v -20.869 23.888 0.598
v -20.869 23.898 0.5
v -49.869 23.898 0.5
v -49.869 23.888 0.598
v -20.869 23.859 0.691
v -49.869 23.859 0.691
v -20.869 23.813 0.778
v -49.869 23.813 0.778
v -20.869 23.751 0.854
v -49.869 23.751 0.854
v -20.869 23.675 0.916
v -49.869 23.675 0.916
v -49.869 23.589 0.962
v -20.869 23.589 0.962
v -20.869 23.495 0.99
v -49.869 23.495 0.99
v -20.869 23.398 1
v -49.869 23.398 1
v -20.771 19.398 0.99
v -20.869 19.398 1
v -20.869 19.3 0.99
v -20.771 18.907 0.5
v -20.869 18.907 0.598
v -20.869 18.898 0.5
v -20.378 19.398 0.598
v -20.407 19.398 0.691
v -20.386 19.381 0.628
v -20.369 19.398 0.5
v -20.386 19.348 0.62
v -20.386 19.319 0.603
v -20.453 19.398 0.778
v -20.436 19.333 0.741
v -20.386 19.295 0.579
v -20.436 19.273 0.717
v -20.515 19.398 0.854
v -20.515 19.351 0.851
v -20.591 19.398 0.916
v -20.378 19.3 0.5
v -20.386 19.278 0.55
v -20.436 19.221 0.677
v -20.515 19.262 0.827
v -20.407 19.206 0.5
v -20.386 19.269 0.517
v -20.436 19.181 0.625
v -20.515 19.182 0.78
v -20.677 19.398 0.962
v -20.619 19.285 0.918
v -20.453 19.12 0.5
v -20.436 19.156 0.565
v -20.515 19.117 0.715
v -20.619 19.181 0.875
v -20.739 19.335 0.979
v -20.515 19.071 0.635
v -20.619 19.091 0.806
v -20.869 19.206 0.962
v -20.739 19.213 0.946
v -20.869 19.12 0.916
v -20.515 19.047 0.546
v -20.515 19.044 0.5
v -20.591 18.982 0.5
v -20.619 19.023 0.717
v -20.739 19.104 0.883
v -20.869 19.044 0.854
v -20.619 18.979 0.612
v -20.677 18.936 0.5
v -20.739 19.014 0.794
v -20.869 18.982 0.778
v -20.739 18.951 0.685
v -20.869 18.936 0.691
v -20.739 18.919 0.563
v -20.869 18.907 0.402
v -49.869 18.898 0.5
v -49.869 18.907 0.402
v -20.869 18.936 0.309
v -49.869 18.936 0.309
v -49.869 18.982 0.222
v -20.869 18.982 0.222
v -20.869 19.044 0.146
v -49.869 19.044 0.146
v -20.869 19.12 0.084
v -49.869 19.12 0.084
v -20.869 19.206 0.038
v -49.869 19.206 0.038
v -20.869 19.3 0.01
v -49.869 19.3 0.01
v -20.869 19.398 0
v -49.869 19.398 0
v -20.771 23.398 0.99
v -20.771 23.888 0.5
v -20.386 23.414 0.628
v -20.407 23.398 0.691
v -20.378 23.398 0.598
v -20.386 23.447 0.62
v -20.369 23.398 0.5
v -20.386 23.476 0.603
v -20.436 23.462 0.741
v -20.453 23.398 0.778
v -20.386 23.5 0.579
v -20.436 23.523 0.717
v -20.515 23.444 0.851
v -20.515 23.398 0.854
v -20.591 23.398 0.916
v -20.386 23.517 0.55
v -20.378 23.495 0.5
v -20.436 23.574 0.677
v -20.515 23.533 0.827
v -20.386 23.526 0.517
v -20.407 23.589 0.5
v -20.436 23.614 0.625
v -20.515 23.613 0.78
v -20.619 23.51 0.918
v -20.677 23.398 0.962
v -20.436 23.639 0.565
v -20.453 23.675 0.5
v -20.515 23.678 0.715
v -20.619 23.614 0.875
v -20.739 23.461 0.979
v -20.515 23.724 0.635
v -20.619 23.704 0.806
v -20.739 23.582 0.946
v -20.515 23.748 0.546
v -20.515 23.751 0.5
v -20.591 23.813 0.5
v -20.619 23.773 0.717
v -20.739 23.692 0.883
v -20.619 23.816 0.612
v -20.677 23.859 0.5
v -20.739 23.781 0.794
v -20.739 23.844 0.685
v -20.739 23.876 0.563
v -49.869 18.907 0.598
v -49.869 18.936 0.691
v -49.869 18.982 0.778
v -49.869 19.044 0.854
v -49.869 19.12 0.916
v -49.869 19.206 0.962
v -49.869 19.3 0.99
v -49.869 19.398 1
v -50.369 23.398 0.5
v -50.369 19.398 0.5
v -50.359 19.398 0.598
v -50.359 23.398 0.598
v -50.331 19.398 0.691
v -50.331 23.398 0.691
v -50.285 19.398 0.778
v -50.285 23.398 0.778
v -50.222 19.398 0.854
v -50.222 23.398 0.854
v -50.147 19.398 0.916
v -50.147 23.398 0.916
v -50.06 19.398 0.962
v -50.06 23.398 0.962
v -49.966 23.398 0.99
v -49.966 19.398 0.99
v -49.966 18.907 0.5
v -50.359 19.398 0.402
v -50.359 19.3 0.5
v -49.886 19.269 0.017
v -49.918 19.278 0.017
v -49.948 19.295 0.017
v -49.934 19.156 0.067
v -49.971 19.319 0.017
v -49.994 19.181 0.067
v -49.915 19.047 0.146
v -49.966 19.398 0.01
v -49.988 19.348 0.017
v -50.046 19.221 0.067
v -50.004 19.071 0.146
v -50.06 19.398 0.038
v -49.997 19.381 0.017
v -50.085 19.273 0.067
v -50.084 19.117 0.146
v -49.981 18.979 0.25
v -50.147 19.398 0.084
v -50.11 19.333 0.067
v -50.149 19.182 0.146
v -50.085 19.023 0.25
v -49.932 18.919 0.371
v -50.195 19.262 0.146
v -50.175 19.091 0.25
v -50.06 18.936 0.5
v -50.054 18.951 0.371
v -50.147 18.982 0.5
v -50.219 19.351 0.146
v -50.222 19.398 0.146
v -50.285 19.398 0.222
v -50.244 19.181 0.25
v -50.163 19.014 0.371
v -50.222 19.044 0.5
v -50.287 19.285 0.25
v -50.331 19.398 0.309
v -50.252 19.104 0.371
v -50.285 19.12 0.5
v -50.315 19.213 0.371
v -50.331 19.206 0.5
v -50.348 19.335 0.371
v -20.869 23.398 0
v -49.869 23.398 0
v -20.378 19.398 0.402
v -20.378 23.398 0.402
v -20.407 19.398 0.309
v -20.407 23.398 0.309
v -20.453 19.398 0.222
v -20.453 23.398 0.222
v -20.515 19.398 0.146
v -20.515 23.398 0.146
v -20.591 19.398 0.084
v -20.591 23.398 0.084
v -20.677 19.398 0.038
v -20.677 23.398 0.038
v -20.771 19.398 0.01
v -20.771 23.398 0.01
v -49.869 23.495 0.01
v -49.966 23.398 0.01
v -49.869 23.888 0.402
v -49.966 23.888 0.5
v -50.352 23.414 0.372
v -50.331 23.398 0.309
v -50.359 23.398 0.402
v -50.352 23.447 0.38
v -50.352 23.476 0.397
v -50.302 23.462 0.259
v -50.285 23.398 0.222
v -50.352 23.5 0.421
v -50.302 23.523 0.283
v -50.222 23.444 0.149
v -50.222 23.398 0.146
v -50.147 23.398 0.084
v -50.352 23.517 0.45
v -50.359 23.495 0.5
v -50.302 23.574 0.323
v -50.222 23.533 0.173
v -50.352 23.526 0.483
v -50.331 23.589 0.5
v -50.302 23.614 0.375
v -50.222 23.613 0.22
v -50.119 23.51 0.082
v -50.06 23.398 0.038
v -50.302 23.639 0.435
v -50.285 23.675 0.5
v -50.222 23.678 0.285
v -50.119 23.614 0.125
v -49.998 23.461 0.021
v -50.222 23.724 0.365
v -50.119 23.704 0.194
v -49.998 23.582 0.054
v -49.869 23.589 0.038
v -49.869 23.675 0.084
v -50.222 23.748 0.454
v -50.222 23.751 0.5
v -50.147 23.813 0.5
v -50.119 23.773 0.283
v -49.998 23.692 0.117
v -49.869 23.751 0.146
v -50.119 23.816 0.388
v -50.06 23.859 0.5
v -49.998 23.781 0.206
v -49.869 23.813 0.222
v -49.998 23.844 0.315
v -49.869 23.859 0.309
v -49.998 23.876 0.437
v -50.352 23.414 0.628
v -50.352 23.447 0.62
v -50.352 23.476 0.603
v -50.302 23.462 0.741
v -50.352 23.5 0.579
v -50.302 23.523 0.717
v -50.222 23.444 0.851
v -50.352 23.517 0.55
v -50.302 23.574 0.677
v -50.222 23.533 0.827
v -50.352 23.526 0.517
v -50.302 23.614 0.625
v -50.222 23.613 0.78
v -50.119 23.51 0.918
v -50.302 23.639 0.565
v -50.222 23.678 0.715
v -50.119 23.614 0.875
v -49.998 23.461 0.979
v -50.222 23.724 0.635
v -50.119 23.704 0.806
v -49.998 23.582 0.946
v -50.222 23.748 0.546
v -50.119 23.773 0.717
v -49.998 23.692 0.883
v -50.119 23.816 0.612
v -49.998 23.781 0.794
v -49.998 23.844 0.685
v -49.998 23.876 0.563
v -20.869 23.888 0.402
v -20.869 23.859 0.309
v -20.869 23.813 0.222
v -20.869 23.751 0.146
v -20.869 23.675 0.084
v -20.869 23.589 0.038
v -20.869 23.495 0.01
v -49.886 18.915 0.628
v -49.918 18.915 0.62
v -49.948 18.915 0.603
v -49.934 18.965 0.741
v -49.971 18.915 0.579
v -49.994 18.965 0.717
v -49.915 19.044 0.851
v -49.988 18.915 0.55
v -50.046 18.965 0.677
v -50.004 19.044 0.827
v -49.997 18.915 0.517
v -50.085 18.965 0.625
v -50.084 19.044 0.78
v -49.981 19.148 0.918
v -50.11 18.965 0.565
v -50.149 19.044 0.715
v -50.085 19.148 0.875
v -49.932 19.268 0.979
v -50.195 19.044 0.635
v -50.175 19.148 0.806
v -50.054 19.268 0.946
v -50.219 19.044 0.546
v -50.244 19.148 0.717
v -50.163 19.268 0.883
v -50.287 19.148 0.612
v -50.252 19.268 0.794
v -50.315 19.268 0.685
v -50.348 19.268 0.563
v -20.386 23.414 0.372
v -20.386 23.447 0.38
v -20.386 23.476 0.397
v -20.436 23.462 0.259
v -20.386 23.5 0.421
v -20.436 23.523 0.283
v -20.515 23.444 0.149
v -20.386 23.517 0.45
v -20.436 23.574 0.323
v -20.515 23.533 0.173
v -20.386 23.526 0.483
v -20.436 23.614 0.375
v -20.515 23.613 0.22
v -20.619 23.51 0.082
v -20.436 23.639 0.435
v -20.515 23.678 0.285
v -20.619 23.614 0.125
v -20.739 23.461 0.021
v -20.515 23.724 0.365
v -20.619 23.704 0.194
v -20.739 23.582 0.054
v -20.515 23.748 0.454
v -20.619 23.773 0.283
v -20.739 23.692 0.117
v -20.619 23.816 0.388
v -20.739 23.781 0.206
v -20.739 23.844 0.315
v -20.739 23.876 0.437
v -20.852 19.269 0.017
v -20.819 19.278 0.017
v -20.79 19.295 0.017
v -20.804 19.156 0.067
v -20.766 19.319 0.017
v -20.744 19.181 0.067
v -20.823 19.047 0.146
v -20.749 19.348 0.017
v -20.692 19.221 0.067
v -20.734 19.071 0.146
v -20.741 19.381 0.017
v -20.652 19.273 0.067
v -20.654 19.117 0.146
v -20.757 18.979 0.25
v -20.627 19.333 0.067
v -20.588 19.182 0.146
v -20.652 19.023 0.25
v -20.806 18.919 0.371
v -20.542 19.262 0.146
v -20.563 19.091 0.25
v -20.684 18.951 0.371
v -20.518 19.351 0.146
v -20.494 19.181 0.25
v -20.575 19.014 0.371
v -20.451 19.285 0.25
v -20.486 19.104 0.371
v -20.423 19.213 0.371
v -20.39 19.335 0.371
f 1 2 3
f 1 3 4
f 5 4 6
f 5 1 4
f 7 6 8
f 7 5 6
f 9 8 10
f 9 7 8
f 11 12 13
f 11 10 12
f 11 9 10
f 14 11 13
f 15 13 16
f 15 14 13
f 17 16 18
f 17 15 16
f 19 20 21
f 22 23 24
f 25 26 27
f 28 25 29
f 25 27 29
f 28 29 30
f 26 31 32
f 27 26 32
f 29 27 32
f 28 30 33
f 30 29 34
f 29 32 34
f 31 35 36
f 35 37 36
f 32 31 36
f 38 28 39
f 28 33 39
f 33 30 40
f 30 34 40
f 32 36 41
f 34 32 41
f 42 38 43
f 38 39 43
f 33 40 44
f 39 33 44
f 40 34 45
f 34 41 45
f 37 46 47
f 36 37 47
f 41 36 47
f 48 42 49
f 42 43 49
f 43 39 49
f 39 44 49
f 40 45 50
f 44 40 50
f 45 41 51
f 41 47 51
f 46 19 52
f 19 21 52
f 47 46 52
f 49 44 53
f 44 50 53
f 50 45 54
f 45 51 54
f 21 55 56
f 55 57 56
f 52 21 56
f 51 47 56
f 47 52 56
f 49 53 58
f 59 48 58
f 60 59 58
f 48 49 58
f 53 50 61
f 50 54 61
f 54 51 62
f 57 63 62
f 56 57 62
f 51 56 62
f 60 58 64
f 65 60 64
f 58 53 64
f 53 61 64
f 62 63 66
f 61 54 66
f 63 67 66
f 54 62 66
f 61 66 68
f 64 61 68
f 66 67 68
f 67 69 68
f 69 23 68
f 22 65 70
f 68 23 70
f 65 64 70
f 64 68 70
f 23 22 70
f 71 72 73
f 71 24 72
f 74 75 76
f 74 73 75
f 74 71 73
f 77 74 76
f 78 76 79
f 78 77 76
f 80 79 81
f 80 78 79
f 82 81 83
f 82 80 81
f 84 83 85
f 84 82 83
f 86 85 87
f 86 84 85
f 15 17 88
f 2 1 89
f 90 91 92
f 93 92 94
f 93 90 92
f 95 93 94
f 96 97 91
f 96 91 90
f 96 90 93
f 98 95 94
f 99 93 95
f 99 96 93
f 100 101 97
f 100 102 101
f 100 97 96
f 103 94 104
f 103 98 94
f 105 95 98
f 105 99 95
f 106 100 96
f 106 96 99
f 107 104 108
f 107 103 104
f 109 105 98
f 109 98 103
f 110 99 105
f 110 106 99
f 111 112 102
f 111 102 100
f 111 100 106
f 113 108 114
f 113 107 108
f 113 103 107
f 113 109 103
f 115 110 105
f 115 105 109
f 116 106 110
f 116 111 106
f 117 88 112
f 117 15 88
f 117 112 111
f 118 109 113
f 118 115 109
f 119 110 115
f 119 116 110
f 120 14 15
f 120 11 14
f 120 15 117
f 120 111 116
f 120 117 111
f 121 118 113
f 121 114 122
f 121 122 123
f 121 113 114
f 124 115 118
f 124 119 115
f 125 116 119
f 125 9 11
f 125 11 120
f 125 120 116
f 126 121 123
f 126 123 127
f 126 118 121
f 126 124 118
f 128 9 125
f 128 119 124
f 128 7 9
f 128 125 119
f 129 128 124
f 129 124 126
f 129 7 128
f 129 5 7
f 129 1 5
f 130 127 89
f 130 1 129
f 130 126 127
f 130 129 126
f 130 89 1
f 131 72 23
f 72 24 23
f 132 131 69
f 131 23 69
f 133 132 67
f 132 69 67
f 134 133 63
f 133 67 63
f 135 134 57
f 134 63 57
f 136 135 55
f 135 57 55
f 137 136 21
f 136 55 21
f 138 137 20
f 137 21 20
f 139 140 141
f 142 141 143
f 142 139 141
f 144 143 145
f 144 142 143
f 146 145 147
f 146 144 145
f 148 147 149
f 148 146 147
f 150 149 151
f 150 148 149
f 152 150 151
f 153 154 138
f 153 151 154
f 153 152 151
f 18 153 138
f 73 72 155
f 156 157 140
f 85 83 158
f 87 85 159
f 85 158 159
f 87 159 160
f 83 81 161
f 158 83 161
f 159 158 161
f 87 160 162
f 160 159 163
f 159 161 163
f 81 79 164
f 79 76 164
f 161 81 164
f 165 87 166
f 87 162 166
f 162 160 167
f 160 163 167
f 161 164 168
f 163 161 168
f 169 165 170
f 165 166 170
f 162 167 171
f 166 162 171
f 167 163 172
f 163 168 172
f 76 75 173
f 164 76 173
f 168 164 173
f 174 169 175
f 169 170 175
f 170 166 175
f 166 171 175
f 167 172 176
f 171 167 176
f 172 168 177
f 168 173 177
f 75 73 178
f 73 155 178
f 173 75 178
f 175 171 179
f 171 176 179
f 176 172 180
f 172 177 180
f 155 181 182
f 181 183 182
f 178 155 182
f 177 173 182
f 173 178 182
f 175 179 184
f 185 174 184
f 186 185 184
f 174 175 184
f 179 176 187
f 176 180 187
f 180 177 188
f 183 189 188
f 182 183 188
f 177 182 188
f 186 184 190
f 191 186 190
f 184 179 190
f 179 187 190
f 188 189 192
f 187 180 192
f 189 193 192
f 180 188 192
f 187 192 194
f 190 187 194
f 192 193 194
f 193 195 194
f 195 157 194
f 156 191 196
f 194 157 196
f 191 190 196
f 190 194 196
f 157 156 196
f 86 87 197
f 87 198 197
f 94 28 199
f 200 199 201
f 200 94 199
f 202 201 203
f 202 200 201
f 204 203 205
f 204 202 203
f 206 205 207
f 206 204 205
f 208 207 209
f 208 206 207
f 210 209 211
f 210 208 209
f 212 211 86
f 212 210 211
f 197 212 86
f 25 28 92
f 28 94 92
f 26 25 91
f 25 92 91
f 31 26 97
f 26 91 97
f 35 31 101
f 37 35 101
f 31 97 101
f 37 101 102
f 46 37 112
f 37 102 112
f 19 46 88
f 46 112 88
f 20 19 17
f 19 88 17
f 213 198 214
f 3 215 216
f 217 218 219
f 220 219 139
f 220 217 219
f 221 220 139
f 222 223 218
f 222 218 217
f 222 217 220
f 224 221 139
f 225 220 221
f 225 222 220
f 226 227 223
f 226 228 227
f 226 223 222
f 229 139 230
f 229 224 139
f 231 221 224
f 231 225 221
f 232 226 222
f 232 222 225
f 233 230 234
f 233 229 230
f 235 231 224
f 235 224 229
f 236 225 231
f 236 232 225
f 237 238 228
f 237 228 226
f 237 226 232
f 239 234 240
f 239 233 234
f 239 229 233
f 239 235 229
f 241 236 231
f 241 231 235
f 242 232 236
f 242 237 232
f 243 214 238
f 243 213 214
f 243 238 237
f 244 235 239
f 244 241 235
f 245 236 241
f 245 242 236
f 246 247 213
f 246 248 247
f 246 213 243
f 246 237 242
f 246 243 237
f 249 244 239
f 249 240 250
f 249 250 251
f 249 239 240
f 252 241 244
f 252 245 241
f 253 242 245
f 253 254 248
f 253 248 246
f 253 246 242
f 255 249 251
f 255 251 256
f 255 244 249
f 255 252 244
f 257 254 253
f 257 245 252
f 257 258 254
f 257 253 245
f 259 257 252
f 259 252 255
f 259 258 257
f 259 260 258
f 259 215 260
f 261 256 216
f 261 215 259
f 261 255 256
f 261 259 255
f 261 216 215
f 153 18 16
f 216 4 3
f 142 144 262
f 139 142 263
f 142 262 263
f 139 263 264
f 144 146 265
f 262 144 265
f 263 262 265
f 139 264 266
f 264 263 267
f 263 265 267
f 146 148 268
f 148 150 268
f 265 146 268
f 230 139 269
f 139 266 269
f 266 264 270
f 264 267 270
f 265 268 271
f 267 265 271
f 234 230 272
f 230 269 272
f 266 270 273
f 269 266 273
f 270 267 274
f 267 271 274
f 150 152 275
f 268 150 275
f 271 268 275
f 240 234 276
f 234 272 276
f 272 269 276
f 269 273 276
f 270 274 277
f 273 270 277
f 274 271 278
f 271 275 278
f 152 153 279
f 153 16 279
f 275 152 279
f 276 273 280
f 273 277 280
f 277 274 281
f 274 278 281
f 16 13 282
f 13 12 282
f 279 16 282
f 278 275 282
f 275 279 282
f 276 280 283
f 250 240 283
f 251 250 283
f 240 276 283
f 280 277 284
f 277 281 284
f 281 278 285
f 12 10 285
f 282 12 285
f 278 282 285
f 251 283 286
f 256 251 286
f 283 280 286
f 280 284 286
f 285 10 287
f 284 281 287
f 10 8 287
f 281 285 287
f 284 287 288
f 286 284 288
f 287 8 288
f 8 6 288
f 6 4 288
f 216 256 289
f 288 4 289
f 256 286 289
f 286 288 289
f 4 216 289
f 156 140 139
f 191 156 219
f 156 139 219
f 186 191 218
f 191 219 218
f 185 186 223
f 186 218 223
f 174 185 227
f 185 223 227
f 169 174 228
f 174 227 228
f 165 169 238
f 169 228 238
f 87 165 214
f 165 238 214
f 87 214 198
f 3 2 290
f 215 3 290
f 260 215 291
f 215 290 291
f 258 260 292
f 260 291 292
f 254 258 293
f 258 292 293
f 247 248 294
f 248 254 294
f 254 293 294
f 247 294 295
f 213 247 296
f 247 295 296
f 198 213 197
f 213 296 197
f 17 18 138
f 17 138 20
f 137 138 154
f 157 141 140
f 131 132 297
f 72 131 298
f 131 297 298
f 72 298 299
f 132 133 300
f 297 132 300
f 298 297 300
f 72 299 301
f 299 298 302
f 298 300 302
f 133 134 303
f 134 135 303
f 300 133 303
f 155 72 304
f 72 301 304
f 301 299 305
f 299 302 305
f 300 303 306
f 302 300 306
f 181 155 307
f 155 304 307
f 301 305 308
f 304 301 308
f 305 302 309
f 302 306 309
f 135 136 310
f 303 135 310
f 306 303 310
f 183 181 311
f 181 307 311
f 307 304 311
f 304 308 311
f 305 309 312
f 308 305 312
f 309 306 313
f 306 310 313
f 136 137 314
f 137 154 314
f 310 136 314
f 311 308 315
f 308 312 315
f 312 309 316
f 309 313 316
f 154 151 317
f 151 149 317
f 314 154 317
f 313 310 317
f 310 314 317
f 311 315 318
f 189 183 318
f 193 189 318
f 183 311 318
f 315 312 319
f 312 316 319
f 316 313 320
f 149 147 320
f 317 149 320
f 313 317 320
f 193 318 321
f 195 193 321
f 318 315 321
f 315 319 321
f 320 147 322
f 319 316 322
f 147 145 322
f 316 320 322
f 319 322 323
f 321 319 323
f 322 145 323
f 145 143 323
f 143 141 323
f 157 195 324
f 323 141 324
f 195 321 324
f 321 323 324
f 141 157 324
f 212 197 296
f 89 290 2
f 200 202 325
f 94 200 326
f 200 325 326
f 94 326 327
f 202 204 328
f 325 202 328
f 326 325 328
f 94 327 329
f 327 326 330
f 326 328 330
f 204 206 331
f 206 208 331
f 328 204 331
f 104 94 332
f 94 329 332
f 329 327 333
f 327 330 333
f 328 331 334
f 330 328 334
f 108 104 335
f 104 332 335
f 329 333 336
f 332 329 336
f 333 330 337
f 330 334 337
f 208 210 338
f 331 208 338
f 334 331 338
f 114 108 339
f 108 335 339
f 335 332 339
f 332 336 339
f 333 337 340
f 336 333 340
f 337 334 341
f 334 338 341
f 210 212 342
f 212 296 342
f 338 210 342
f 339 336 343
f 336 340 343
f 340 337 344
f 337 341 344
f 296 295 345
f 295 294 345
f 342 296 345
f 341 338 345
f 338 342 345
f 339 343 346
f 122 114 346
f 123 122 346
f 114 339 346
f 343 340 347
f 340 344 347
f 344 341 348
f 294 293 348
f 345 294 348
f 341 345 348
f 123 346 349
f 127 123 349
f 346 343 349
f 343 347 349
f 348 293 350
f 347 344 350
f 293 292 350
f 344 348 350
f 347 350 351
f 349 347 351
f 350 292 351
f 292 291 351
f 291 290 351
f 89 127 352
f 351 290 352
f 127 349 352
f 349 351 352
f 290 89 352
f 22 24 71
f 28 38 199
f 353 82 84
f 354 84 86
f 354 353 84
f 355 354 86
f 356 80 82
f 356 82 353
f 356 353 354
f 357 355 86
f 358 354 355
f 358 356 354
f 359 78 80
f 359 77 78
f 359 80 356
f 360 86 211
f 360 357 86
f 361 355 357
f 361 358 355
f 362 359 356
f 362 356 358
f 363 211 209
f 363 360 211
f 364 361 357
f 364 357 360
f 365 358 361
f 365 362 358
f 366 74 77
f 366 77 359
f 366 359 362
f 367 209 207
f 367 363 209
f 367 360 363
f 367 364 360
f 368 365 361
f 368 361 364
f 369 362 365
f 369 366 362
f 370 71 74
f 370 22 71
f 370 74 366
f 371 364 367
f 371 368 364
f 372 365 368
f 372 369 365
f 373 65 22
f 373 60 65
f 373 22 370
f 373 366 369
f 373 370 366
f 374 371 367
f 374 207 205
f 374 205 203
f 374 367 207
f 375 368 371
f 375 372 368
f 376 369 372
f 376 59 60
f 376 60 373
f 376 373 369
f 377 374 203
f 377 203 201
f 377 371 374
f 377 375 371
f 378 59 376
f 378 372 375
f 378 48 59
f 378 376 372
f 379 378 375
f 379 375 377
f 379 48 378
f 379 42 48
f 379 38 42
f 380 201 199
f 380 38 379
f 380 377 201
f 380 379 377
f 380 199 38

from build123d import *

# Parameters (mm, degrees)
F0_W     = 30
F0_H     = 5
F1_DEPTH = 1
F2_R     = 0.49999


# Not quite as in the source:
# - a fillet or chamfer is up to 0.001 mm smaller than in the source, because OpenCascade refuses the exact size


with BuildPart() as f1:
    # F0 (on Top) → F1 (new body)
    with BuildSketch(Plane.XY):
        with Locations((-35.3688234463, 21.3975507232)):
            Rectangle(F0_W, F0_H)
    extrude(amount=F1_DEPTH)

    # F2 (radius 0.5 in the source; OpenCascade refuses exactly that, so slightly less here)
    f2_edges = [f1.edges().sort_by_distance(p)[0] for p in [
        (-35.368823, 23.897551, 1),
        (-50.368823, 21.397551, 1),
        (-35.368823, 18.897551, 1),
        (-20.368823, 21.397551, 1),
        (-50.368823, 18.897551, 0.5),
        (-20.368823, 18.897551, 0.5),
        (-35.368823, 18.897551, 0),
        (-35.368823, 23.897551, 0),
        (-50.368823, 21.397551, 0),
        (-20.368823, 21.397551, 0),
        (-20.368823, 23.897551, 0.5),
        (-50.368823, 23.897551, 0.5),
    ]]
    fillet(f2_edges, radius=F2_R)


solid = f1.part
